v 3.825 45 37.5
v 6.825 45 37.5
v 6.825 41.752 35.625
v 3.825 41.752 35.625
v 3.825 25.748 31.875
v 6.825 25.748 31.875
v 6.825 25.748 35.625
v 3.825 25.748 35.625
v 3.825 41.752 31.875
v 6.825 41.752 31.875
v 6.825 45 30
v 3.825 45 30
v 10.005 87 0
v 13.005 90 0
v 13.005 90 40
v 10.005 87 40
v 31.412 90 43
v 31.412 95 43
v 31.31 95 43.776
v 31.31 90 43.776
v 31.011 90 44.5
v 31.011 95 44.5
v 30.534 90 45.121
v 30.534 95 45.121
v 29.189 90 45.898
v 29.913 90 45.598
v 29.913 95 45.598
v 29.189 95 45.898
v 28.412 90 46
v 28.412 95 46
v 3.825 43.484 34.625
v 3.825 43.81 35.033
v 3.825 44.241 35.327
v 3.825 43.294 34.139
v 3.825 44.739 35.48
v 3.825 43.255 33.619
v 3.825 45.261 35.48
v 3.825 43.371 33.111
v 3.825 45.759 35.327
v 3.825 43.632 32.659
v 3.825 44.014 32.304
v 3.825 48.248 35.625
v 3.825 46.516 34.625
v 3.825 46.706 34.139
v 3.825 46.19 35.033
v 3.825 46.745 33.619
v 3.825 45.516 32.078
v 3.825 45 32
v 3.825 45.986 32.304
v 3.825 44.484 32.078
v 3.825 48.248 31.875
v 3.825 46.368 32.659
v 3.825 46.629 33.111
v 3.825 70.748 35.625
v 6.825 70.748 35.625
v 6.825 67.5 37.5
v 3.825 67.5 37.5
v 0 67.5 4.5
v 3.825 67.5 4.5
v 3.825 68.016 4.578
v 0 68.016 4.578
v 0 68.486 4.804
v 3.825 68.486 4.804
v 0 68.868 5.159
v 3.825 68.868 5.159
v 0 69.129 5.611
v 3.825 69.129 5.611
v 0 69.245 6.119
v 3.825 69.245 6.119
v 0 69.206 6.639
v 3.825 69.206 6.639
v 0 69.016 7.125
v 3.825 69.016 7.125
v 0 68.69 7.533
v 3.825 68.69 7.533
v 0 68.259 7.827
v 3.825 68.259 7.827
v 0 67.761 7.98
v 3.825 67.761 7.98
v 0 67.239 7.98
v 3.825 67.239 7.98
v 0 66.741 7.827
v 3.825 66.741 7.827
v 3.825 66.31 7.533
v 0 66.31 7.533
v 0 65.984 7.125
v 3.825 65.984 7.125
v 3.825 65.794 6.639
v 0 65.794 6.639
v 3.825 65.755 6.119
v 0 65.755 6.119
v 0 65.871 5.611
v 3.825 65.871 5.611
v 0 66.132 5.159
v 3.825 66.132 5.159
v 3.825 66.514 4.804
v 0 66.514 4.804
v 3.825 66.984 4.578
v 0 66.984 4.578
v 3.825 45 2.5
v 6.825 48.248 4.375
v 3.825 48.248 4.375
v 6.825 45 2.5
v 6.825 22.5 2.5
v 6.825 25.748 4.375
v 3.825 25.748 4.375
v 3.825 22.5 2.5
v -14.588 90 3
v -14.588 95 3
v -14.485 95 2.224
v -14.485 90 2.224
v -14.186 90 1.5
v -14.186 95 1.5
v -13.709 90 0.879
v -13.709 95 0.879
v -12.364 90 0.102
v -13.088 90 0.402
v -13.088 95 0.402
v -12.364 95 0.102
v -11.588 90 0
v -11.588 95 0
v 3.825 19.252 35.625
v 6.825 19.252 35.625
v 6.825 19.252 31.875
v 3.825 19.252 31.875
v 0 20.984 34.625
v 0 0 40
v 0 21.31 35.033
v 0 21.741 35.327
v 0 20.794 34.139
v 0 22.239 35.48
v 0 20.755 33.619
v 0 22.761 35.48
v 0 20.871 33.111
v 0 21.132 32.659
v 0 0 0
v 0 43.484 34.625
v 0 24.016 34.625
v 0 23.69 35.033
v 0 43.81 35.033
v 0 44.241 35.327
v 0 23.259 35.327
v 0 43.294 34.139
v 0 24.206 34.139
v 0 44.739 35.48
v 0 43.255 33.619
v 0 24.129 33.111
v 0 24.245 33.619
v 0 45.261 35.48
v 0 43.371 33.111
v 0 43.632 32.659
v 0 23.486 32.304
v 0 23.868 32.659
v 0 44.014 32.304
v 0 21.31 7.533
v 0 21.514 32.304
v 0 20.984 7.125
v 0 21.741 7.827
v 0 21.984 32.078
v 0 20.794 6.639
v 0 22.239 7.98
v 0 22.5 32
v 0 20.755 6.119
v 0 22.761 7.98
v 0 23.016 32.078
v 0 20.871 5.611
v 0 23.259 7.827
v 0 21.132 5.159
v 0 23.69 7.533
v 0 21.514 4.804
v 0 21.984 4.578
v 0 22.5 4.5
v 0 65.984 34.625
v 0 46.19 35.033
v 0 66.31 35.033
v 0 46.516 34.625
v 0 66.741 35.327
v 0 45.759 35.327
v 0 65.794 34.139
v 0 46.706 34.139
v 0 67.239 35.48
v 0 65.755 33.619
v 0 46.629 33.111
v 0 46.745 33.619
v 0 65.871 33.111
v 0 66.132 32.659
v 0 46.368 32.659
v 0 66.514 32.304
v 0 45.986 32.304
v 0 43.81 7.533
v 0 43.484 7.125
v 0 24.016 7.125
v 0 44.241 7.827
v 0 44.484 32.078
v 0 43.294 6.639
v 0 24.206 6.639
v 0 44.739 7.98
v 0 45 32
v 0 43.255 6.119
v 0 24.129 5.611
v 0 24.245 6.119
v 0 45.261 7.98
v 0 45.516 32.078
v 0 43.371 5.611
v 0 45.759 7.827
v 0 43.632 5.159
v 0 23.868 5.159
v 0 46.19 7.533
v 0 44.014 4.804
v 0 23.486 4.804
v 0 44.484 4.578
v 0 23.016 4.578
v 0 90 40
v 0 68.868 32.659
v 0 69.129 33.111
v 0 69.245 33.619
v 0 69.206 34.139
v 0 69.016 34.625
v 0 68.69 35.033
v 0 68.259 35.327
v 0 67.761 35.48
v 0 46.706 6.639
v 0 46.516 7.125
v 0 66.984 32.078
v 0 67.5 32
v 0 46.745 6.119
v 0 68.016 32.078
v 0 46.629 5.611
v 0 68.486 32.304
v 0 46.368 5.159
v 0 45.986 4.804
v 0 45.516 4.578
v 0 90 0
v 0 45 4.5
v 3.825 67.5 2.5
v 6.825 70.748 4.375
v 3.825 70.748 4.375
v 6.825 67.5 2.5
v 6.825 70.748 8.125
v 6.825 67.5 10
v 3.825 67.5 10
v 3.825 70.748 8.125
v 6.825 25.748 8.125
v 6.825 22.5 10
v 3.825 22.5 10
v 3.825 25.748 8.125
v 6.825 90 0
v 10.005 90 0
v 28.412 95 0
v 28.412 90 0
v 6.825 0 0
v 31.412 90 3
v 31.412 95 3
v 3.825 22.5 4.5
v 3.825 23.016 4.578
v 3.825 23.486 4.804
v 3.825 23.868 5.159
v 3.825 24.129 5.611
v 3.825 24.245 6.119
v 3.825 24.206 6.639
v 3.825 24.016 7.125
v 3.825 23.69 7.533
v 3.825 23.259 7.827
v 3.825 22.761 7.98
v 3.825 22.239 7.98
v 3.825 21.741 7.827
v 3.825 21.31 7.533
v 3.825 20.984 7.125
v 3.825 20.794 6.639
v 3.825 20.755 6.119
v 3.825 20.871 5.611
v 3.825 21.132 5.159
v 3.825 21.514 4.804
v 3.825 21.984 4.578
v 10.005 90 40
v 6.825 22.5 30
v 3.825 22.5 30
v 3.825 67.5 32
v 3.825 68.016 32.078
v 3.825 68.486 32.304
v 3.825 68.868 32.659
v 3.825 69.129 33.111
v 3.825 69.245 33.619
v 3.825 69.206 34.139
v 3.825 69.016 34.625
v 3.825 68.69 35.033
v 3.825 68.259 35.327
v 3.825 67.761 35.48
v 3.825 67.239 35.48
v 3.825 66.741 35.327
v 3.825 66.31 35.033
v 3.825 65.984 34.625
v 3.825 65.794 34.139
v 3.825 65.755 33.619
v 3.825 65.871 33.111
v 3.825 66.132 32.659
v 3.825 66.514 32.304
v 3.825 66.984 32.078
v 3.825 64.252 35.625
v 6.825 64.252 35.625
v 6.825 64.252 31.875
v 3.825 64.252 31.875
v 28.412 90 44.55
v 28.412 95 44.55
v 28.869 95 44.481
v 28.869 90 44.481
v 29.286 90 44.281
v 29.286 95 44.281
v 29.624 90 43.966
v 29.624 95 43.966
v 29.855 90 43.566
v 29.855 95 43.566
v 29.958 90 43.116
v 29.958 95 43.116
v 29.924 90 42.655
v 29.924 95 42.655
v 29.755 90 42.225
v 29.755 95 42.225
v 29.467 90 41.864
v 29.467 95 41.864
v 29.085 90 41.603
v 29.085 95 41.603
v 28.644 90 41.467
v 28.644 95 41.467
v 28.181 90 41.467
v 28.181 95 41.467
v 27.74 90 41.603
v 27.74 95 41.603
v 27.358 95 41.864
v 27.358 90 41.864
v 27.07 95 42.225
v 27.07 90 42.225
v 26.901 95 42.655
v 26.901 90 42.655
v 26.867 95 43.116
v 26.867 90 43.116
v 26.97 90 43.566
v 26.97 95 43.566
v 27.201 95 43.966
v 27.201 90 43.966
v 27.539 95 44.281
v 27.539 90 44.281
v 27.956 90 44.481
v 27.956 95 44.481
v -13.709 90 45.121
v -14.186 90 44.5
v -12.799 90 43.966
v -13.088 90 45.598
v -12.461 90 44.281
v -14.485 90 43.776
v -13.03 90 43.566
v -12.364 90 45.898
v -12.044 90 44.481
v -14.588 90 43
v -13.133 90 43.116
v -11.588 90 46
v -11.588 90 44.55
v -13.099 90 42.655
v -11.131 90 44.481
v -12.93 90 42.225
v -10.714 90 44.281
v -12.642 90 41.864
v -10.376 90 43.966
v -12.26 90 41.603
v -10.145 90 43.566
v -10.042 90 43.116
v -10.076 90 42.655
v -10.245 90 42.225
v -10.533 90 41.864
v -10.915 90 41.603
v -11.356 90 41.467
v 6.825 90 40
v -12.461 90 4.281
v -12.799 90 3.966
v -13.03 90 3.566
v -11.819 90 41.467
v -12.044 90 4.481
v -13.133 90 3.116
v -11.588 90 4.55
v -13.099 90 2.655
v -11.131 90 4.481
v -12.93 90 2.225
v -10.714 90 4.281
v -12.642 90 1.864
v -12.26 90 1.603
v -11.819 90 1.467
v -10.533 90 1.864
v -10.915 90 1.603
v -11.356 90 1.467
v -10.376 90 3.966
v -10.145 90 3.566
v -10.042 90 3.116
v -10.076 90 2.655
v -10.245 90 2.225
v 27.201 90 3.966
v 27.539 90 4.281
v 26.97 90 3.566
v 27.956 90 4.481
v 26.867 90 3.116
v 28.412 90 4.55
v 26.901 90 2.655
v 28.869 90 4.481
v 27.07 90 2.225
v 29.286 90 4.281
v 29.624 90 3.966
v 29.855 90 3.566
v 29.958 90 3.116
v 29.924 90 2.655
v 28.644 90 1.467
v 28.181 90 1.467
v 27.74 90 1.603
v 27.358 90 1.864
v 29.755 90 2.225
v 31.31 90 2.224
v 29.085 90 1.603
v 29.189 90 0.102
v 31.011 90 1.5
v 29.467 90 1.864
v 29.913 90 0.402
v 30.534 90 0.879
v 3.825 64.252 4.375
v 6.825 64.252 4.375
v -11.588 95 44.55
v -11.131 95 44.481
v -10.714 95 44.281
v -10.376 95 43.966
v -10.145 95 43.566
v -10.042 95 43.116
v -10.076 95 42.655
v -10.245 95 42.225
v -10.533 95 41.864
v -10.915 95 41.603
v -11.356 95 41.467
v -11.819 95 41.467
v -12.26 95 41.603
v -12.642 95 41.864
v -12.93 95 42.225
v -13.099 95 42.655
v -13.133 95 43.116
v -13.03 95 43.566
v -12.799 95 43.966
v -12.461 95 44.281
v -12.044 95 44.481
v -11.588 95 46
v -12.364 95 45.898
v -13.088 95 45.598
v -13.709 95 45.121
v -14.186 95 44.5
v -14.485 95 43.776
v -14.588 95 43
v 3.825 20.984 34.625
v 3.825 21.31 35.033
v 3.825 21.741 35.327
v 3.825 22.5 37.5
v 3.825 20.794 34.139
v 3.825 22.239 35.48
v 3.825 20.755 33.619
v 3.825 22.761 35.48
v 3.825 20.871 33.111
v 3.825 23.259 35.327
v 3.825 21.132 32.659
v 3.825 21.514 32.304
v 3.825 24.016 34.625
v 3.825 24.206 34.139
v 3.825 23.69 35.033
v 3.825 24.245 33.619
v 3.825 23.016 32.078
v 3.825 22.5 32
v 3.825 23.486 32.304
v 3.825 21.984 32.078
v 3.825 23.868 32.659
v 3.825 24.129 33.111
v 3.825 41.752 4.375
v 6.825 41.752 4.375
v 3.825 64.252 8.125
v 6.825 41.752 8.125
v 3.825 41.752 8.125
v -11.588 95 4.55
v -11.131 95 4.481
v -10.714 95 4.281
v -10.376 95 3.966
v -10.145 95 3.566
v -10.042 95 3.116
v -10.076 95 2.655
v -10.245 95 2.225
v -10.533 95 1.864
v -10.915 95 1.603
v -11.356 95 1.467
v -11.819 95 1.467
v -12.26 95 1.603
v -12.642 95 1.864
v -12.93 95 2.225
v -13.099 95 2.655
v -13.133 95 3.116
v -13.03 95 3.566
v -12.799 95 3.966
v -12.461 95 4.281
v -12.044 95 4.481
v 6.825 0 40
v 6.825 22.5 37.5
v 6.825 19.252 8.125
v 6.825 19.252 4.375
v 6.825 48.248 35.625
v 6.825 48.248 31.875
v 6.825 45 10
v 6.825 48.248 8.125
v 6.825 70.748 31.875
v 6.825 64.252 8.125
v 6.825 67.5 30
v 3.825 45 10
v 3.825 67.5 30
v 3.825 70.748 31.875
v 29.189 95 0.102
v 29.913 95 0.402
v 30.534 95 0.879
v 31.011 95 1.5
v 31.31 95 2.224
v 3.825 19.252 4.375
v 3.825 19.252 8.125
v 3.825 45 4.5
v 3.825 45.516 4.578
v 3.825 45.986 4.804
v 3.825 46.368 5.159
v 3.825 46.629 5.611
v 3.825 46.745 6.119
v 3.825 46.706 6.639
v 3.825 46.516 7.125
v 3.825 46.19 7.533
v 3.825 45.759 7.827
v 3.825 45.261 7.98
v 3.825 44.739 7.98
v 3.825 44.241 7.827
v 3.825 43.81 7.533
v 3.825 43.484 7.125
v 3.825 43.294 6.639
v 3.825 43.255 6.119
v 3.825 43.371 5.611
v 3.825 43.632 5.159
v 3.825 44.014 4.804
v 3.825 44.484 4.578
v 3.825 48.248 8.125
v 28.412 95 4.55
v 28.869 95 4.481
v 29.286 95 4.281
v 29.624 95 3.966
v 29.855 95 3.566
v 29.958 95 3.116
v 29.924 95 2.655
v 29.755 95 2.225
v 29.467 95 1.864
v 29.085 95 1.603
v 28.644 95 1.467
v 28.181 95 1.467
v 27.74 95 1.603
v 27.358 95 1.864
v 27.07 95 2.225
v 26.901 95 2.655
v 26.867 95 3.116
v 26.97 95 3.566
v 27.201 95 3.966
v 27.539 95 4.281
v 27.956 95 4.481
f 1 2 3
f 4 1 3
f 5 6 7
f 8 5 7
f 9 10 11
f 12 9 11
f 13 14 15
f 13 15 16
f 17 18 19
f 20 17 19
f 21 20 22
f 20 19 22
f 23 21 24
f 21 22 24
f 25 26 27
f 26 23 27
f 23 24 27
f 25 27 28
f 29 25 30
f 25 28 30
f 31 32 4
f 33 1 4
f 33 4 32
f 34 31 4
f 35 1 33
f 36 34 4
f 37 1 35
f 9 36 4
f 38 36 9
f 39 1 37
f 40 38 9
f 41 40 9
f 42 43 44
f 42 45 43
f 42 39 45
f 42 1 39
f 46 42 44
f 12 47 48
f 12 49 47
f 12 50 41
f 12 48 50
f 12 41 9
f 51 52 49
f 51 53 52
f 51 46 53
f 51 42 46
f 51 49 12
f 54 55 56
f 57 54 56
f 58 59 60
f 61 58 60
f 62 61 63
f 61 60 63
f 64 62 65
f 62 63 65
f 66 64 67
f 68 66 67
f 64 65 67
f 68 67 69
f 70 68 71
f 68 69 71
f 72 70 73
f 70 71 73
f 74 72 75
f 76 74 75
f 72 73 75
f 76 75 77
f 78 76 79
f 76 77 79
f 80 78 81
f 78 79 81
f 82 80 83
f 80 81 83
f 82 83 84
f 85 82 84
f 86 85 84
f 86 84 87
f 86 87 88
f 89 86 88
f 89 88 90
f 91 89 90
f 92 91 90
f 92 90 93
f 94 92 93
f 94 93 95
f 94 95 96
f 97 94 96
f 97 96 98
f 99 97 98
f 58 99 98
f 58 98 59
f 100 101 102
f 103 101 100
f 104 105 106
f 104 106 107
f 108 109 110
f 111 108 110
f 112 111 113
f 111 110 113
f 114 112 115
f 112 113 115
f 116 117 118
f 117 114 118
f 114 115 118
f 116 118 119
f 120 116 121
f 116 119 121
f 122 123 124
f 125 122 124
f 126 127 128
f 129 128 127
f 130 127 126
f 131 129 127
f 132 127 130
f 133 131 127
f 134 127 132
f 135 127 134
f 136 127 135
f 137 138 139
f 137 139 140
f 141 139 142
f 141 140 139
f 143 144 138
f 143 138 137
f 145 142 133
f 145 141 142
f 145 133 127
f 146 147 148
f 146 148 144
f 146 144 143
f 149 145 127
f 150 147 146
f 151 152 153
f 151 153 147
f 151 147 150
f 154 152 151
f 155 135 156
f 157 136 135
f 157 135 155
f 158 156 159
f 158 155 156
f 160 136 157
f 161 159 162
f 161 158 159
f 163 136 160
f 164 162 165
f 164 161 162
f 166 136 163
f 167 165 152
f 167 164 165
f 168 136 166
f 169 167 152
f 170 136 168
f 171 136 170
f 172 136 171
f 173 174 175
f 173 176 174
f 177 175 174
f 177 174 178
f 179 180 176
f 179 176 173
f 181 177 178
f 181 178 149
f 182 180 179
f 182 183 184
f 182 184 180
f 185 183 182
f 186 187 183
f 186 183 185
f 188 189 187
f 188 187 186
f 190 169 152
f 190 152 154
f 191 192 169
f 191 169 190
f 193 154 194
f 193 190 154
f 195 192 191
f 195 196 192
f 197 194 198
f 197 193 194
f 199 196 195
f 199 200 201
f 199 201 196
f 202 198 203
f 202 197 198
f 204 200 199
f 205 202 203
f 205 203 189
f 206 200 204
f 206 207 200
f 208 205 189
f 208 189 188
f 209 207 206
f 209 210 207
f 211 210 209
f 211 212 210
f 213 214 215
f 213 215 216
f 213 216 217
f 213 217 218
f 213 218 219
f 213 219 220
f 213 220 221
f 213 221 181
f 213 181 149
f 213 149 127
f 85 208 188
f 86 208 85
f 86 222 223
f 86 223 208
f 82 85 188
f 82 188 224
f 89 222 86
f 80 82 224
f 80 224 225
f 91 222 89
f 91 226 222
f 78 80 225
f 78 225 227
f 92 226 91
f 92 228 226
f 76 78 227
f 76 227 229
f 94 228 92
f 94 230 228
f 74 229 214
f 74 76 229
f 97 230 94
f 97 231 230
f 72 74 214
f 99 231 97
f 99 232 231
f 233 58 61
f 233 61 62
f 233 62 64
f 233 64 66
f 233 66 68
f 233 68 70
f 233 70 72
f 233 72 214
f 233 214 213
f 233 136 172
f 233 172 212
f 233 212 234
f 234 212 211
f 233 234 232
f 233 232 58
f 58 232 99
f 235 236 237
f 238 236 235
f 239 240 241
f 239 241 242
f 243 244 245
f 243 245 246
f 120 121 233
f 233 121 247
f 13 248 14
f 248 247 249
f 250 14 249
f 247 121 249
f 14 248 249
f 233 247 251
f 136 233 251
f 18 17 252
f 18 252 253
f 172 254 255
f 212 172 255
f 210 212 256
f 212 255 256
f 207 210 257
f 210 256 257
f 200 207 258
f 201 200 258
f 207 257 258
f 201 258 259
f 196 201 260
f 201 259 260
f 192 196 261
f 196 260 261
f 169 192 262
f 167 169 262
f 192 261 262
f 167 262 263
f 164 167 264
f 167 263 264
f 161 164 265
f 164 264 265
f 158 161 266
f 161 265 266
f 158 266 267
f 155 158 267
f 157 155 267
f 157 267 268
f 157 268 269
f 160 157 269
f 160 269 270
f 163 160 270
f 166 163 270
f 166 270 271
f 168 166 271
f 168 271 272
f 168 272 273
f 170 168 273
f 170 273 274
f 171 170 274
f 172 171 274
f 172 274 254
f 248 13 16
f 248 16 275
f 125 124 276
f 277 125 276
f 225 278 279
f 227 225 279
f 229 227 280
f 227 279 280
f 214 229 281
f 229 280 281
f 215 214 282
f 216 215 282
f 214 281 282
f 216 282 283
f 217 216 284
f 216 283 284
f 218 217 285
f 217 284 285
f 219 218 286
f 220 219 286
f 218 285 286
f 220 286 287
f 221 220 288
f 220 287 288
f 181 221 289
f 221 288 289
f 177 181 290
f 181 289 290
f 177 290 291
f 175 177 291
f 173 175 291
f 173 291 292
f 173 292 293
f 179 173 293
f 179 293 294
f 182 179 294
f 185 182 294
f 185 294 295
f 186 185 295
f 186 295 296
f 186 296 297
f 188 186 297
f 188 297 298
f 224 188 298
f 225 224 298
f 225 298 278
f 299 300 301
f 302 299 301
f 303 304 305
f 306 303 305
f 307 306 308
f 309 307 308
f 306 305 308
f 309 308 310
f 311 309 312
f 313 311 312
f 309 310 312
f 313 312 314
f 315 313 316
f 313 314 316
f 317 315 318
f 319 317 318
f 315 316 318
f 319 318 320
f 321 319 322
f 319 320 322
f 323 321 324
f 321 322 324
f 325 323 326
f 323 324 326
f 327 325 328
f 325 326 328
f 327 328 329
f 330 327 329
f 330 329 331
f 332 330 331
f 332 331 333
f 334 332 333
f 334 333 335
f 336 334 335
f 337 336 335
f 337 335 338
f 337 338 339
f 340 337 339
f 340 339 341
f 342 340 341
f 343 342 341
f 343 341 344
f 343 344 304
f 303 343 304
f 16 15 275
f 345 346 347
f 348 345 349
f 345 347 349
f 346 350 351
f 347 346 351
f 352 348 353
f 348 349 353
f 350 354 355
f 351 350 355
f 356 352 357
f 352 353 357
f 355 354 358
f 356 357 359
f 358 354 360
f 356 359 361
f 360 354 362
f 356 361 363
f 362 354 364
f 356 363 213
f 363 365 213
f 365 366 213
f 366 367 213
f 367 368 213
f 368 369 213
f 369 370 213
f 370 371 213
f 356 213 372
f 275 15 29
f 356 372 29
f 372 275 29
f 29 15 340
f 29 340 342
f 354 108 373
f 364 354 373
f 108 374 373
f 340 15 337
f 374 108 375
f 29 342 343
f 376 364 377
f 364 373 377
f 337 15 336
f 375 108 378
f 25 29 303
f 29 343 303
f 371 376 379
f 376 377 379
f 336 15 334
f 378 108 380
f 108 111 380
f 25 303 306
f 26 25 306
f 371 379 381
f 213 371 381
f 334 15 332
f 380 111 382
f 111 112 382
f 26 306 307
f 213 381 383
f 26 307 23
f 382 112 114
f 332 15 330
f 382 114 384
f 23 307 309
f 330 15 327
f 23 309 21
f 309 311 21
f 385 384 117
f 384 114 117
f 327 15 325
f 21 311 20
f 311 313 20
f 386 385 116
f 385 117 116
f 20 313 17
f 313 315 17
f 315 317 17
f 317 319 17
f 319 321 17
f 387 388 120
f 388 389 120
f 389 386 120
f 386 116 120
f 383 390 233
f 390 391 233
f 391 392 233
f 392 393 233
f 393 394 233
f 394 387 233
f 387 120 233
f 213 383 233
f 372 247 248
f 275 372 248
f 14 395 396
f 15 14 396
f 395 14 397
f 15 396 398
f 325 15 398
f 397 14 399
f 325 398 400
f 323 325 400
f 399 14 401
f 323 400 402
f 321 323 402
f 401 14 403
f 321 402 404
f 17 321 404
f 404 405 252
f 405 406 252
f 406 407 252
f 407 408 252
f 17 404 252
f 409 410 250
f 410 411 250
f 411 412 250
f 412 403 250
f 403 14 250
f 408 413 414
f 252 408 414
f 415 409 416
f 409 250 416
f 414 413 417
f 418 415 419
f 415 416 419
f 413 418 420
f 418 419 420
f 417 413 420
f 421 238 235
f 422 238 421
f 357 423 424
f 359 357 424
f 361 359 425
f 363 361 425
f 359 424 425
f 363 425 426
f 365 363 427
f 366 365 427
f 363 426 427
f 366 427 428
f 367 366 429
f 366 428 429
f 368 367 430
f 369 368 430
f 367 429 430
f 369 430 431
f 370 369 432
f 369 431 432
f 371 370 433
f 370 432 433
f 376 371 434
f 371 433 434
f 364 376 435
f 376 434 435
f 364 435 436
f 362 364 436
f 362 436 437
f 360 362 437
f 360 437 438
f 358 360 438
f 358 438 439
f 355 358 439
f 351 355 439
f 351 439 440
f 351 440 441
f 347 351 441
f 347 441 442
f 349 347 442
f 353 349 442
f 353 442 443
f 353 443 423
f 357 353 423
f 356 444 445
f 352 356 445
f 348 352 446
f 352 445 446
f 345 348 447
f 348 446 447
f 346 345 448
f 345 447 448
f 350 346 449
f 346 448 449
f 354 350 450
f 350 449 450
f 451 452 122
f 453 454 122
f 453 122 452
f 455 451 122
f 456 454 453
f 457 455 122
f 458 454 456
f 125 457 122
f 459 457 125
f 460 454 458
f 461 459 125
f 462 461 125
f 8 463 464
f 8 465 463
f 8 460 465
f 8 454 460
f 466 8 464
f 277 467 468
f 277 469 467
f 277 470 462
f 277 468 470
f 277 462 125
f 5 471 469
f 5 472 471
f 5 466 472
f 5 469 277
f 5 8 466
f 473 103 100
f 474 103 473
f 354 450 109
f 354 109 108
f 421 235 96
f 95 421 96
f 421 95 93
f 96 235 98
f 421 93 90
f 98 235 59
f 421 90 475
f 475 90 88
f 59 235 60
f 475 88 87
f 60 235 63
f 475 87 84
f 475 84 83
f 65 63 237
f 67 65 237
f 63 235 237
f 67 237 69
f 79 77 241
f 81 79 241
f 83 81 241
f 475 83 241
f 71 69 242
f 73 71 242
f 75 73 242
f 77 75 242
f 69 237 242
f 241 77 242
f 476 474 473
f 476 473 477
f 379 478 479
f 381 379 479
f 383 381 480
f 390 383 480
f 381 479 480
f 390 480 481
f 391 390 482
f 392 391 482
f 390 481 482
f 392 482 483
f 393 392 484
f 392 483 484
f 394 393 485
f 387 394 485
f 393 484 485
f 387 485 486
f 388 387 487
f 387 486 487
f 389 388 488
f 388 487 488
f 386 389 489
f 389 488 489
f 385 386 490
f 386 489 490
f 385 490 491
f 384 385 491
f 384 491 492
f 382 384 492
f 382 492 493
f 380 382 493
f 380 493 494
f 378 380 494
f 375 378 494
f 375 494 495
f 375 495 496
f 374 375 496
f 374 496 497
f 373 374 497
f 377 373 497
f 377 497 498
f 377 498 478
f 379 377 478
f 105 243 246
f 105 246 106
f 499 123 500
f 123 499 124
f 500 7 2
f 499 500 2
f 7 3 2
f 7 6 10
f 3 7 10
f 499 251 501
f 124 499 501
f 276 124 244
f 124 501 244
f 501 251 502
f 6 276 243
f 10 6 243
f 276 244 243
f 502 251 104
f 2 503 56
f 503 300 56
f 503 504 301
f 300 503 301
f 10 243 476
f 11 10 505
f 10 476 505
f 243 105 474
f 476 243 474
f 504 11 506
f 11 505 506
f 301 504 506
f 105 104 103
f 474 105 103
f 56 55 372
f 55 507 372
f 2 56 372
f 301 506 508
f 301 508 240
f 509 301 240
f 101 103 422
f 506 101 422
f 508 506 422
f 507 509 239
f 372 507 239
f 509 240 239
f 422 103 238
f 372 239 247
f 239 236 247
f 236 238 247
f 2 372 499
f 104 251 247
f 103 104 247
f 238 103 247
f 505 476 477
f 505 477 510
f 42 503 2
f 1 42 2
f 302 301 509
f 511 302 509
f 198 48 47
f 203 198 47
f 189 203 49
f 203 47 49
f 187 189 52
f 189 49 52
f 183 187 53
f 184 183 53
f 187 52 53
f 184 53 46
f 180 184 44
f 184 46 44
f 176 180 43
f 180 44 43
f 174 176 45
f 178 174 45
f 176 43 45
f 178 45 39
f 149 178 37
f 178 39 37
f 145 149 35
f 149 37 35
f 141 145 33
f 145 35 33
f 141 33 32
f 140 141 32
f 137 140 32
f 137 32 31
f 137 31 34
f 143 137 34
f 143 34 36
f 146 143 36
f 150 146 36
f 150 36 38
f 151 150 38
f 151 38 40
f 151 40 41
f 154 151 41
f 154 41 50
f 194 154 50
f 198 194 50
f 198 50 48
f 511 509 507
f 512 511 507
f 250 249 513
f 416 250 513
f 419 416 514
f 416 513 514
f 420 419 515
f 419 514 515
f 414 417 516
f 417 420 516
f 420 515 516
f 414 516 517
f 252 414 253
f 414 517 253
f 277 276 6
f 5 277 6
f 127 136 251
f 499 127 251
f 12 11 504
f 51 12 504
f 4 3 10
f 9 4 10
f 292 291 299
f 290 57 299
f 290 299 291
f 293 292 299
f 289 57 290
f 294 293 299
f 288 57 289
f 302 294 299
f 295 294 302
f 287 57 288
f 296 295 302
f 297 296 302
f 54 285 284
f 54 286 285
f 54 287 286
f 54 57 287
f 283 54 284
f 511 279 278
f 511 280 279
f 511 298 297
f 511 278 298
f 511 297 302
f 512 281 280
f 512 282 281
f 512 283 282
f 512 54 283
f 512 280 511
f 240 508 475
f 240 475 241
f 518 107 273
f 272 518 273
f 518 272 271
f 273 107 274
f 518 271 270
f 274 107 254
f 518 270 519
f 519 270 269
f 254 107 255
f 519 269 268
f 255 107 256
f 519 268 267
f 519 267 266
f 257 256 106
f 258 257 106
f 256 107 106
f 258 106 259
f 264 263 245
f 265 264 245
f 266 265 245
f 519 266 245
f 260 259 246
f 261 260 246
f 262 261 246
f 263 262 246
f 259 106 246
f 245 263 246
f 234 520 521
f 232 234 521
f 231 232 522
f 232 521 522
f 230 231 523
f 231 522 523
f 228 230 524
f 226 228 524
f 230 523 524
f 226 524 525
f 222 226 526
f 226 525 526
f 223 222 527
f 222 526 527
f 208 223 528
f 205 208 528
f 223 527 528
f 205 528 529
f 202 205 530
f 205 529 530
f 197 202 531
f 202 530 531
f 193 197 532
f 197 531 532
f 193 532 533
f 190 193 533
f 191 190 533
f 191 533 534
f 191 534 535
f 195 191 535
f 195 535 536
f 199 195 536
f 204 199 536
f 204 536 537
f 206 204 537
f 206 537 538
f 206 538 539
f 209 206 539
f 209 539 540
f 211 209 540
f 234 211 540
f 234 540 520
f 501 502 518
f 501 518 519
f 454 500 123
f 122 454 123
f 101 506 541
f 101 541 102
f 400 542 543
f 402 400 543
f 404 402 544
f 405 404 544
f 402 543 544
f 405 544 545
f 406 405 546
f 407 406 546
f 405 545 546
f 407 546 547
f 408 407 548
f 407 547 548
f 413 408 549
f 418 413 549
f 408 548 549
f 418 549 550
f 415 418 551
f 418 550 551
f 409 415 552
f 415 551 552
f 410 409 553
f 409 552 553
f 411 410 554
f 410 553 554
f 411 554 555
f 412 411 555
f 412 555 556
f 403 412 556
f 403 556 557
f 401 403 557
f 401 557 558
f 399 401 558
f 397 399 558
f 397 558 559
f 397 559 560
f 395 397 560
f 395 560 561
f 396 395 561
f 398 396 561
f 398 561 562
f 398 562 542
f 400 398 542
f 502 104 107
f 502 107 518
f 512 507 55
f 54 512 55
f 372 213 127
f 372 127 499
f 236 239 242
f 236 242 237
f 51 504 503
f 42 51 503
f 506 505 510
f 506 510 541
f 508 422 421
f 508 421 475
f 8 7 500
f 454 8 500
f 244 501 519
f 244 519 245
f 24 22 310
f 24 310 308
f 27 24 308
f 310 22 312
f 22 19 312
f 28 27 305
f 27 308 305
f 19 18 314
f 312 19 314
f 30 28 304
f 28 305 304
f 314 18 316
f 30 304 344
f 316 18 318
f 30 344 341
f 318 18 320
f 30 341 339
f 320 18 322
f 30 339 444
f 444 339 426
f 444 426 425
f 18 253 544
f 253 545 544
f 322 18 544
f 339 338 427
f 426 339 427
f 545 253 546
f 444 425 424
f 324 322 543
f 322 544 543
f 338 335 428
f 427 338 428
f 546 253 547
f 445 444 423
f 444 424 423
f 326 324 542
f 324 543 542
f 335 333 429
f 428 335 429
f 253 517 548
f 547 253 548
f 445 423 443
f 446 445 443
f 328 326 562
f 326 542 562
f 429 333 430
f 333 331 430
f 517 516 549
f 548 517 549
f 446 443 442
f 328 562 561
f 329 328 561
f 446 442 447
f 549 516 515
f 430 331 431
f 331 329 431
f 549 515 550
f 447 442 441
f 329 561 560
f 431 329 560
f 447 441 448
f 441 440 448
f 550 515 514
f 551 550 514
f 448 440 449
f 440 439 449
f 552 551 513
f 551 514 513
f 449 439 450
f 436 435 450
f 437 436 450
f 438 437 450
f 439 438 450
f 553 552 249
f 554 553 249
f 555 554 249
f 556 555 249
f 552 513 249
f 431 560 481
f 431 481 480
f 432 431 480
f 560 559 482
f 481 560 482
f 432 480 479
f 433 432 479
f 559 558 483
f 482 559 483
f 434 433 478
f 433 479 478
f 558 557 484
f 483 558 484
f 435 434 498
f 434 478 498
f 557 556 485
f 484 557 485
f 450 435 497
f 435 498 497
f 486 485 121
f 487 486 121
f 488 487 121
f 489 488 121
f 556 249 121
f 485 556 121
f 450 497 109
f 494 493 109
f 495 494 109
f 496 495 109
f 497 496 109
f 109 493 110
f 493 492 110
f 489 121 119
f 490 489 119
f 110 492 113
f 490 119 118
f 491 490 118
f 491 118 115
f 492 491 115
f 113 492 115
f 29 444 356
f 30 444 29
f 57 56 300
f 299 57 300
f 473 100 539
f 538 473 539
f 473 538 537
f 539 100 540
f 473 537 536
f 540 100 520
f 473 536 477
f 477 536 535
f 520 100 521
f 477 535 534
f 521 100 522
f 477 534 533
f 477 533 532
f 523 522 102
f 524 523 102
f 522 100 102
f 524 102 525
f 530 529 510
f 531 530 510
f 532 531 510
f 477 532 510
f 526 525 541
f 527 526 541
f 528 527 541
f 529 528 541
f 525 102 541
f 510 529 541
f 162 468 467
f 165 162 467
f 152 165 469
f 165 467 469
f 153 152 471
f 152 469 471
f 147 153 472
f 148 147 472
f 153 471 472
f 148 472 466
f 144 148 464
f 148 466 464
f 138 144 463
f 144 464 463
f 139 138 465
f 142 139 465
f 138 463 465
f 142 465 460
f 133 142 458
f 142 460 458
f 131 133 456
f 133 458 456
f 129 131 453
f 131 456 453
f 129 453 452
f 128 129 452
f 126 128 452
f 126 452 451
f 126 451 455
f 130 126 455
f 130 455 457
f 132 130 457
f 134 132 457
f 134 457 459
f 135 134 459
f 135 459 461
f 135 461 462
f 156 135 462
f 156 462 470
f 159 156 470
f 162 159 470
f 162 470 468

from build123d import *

# Parameters (mm, degrees)
SLEEVE_OUTLINE_DEPTH = 46
SKETCH2_4_W          = 6.825
SKETCH2_4_H          = 90
BEAM_MOUNTING_DEPTH  = 40
SKETCH3_R            = 1.75
NUT_INSERTS_DEPTH    = 3
SKETCH3_4_R          = 1.75
SCREW_INSERTS_DEPTH  = 23
SKETCH4_R            = 1.55
BOARD_SHAPING_DEPTH  = 10


with BuildPart() as part:
    # Sketch2 → Sleeve_Outline (new body)
    with BuildSketch(Plane.XY):
        Polygon((-14.5875, 90), (0, 90), (6.825, 90), (10, 90), (10.005, 90), (13.005, 90), (31.4125, 90), (31.4125, 95), (-14.5875, 95), align=None)
    extrude(amount=SLEEVE_OUTLINE_DEPTH)

    # Sketch2<4> → Beam_Mounting (add)
    with BuildSketch(Plane.XY):
        with Locations((3.4125, 45)):
            Rectangle(SKETCH2_4_W, SKETCH2_4_H)
        Polygon((10.005, 90), (13.005, 90), (10.005, 87), align=None)
    extrude(amount=BEAM_MOUNTING_DEPTH)

    # Sketch3 → Nut_Inserts (cut)
    # profile 1 of 6: a face of its own
    with BuildSketch(Plane(origin=(6.825, 0, 0), x_dir=(0, 0, -1), z_dir=(1, 0, 0))):
        Polygon((-30, 45), (-31.875, 48.247595264), (-35.625, 48.247595264), (-37.5, 45), (-35.625, 41.752404736), (-31.875, 41.752404736), align=None)
        with Locations((-33.75, 45)):
            Circle(SKETCH3_R, mode=Mode.SUBTRACT)
    # profile 2 of 6: a face of its own
    with BuildSketch(Plane(origin=(6.825, 0, 0), x_dir=(0, 0, -1), z_dir=(1, 0, 0))):
        Polygon((-37.5, 22.5), (-35.625, 19.252404736), (-31.875, 19.252404736), (-30, 22.5), (-31.875, 25.747595264), (-35.625, 25.747595264), align=None)
        with Locations((-33.75, 22.5)):
            Circle(SKETCH3_R, mode=Mode.SUBTRACT)
    # profile 3 of 6: a face of its own
    with BuildSketch(Plane(origin=(6.825, 0, 0), x_dir=(0, 0, -1), z_dir=(1, 0, 0))):
        Polygon((-37.5, 67.5), (-35.625, 64.252404736), (-31.875, 64.252404736), (-30, 67.5), (-31.875, 70.747595264), (-35.625, 70.747595264), align=None)
        with Locations((-33.75, 67.5)):
            Circle(SKETCH3_R, mode=Mode.SUBTRACT)
    # profile 4 of 6: a face of its own
    with BuildSketch(Plane(origin=(6.825, 0, 0), x_dir=(0, 0, -1), z_dir=(1, 0, 0))):
        Polygon((-8.125, 70.747595264), (-4.375, 70.747595264), (-2.5, 67.5), (-4.375, 64.252404736), (-8.125, 64.252404736), (-10, 67.5), align=None)
        with Locations((-6.25, 67.5)):
            Circle(SKETCH3_R, mode=Mode.SUBTRACT)
    # profile 5 of 6: a face of its own
    with BuildSketch(Plane(origin=(6.825, 0, 0), x_dir=(0, 0, -1), z_dir=(1, 0, 0))):
        Polygon((-4.375, 48.247595264), (-2.5, 45), (-4.375, 41.752404736), (-8.125, 41.752404736), (-10, 45), (-8.125, 48.247595264), align=None)
        with Locations((-6.25, 45)):
            Circle(SKETCH3_R, mode=Mode.SUBTRACT)
    # profile 6 of 6: a face of its own
    with BuildSketch(Plane(origin=(6.825, 0, 0), x_dir=(0, 0, -1), z_dir=(1, 0, 0))):
        Polygon((-4.375, 25.747595264), (-2.5, 22.5), (-4.375, 19.252404736), (-8.125, 19.252404736), (-10, 22.5), (-8.125, 25.747595264), align=None)
        with Locations((-6.25, 22.5)):
            Circle(SKETCH3_R, mode=Mode.SUBTRACT)
    extrude(amount=-NUT_INSERTS_DEPTH, mode=Mode.SUBTRACT)

    # Sketch3<4> → Screw_Inserts (cut)
    with BuildSketch(Plane(origin=(6.825, 0, 0), x_dir=(0, 0, -1), z_dir=(1, 0, 0))):
        with Locations((-33.75, 67.5)):
            Circle(SKETCH3_4_R)
        with Locations((-33.75, 45)):
            Circle(SKETCH3_4_R)
        with Locations((-33.75, 22.5)):
            Circle(SKETCH3_4_R)
        with Locations((-6.25, 22.5)):
            Circle(SKETCH3_4_R)
        with Locations((-6.25, 45)):
            Circle(SKETCH3_4_R)
        with Locations((-6.25, 67.5)):
            Circle(SKETCH3_4_R)
    extrude(amount=-SCREW_INSERTS_DEPTH, mode=Mode.SUBTRACT)

    # Sketch4 → Board_Shaping (cut)
    with BuildSketch(Plane(origin=(0, 95, 0), x_dir=(1, 0, 0), z_dir=(0, 1, 0))):
        with BuildLine():
            ThreePointArc((-11.5875, -46), (-13.708820344, -45.121320344), (-14.5875, -43))
            Line((-14.5875, -43), (-14.5875, -46))
            Line((-14.5875, -46), (-11.5875, -46))
        make_face()
        with Locations(Location((-11.5875, -43, 0), (0, 0, 270))):
            Circle(SKETCH4_R)
        with Locations(Location((-11.5875, -3, 0), (0, 0, 270))):
            Circle(SKETCH4_R)
        with BuildLine():
            ThreePointArc((-14.5875, -3), (-13.708820344, -0.878679656), (-11.5875, 0))
            Line((-11.5875, 0), (-14.5875, 0))
            Line((-14.5875, 0), (-14.5875, -3))
        make_face()
        with BuildLine():
            Line((31.4125, 0), (28.4125, 0))
            ThreePointArc((28.4125, 0), (30.533820344, -0.878679656), (31.4125, -3))
            Line((31.4125, -3), (31.4125, 0))
        make_face()
        with Locations(Location((28.4125, -3, 0), (0, 0, 270))):
            Circle(SKETCH4_R)
        with Locations(Location((28.4125, -43, 0), (0, 0, 270))):
            Circle(SKETCH4_R)
        with BuildLine():
            Line((31.4125, -46), (31.4125, -43))
            ThreePointArc((31.4125, -43), (30.533820344, -45.121320344), (28.4125, -46))
            Line((28.4125, -46), (31.4125, -46))
        make_face()
    extrude(amount=-BOARD_SHAPING_DEPTH, mode=Mode.SUBTRACT)


solid = part.part
